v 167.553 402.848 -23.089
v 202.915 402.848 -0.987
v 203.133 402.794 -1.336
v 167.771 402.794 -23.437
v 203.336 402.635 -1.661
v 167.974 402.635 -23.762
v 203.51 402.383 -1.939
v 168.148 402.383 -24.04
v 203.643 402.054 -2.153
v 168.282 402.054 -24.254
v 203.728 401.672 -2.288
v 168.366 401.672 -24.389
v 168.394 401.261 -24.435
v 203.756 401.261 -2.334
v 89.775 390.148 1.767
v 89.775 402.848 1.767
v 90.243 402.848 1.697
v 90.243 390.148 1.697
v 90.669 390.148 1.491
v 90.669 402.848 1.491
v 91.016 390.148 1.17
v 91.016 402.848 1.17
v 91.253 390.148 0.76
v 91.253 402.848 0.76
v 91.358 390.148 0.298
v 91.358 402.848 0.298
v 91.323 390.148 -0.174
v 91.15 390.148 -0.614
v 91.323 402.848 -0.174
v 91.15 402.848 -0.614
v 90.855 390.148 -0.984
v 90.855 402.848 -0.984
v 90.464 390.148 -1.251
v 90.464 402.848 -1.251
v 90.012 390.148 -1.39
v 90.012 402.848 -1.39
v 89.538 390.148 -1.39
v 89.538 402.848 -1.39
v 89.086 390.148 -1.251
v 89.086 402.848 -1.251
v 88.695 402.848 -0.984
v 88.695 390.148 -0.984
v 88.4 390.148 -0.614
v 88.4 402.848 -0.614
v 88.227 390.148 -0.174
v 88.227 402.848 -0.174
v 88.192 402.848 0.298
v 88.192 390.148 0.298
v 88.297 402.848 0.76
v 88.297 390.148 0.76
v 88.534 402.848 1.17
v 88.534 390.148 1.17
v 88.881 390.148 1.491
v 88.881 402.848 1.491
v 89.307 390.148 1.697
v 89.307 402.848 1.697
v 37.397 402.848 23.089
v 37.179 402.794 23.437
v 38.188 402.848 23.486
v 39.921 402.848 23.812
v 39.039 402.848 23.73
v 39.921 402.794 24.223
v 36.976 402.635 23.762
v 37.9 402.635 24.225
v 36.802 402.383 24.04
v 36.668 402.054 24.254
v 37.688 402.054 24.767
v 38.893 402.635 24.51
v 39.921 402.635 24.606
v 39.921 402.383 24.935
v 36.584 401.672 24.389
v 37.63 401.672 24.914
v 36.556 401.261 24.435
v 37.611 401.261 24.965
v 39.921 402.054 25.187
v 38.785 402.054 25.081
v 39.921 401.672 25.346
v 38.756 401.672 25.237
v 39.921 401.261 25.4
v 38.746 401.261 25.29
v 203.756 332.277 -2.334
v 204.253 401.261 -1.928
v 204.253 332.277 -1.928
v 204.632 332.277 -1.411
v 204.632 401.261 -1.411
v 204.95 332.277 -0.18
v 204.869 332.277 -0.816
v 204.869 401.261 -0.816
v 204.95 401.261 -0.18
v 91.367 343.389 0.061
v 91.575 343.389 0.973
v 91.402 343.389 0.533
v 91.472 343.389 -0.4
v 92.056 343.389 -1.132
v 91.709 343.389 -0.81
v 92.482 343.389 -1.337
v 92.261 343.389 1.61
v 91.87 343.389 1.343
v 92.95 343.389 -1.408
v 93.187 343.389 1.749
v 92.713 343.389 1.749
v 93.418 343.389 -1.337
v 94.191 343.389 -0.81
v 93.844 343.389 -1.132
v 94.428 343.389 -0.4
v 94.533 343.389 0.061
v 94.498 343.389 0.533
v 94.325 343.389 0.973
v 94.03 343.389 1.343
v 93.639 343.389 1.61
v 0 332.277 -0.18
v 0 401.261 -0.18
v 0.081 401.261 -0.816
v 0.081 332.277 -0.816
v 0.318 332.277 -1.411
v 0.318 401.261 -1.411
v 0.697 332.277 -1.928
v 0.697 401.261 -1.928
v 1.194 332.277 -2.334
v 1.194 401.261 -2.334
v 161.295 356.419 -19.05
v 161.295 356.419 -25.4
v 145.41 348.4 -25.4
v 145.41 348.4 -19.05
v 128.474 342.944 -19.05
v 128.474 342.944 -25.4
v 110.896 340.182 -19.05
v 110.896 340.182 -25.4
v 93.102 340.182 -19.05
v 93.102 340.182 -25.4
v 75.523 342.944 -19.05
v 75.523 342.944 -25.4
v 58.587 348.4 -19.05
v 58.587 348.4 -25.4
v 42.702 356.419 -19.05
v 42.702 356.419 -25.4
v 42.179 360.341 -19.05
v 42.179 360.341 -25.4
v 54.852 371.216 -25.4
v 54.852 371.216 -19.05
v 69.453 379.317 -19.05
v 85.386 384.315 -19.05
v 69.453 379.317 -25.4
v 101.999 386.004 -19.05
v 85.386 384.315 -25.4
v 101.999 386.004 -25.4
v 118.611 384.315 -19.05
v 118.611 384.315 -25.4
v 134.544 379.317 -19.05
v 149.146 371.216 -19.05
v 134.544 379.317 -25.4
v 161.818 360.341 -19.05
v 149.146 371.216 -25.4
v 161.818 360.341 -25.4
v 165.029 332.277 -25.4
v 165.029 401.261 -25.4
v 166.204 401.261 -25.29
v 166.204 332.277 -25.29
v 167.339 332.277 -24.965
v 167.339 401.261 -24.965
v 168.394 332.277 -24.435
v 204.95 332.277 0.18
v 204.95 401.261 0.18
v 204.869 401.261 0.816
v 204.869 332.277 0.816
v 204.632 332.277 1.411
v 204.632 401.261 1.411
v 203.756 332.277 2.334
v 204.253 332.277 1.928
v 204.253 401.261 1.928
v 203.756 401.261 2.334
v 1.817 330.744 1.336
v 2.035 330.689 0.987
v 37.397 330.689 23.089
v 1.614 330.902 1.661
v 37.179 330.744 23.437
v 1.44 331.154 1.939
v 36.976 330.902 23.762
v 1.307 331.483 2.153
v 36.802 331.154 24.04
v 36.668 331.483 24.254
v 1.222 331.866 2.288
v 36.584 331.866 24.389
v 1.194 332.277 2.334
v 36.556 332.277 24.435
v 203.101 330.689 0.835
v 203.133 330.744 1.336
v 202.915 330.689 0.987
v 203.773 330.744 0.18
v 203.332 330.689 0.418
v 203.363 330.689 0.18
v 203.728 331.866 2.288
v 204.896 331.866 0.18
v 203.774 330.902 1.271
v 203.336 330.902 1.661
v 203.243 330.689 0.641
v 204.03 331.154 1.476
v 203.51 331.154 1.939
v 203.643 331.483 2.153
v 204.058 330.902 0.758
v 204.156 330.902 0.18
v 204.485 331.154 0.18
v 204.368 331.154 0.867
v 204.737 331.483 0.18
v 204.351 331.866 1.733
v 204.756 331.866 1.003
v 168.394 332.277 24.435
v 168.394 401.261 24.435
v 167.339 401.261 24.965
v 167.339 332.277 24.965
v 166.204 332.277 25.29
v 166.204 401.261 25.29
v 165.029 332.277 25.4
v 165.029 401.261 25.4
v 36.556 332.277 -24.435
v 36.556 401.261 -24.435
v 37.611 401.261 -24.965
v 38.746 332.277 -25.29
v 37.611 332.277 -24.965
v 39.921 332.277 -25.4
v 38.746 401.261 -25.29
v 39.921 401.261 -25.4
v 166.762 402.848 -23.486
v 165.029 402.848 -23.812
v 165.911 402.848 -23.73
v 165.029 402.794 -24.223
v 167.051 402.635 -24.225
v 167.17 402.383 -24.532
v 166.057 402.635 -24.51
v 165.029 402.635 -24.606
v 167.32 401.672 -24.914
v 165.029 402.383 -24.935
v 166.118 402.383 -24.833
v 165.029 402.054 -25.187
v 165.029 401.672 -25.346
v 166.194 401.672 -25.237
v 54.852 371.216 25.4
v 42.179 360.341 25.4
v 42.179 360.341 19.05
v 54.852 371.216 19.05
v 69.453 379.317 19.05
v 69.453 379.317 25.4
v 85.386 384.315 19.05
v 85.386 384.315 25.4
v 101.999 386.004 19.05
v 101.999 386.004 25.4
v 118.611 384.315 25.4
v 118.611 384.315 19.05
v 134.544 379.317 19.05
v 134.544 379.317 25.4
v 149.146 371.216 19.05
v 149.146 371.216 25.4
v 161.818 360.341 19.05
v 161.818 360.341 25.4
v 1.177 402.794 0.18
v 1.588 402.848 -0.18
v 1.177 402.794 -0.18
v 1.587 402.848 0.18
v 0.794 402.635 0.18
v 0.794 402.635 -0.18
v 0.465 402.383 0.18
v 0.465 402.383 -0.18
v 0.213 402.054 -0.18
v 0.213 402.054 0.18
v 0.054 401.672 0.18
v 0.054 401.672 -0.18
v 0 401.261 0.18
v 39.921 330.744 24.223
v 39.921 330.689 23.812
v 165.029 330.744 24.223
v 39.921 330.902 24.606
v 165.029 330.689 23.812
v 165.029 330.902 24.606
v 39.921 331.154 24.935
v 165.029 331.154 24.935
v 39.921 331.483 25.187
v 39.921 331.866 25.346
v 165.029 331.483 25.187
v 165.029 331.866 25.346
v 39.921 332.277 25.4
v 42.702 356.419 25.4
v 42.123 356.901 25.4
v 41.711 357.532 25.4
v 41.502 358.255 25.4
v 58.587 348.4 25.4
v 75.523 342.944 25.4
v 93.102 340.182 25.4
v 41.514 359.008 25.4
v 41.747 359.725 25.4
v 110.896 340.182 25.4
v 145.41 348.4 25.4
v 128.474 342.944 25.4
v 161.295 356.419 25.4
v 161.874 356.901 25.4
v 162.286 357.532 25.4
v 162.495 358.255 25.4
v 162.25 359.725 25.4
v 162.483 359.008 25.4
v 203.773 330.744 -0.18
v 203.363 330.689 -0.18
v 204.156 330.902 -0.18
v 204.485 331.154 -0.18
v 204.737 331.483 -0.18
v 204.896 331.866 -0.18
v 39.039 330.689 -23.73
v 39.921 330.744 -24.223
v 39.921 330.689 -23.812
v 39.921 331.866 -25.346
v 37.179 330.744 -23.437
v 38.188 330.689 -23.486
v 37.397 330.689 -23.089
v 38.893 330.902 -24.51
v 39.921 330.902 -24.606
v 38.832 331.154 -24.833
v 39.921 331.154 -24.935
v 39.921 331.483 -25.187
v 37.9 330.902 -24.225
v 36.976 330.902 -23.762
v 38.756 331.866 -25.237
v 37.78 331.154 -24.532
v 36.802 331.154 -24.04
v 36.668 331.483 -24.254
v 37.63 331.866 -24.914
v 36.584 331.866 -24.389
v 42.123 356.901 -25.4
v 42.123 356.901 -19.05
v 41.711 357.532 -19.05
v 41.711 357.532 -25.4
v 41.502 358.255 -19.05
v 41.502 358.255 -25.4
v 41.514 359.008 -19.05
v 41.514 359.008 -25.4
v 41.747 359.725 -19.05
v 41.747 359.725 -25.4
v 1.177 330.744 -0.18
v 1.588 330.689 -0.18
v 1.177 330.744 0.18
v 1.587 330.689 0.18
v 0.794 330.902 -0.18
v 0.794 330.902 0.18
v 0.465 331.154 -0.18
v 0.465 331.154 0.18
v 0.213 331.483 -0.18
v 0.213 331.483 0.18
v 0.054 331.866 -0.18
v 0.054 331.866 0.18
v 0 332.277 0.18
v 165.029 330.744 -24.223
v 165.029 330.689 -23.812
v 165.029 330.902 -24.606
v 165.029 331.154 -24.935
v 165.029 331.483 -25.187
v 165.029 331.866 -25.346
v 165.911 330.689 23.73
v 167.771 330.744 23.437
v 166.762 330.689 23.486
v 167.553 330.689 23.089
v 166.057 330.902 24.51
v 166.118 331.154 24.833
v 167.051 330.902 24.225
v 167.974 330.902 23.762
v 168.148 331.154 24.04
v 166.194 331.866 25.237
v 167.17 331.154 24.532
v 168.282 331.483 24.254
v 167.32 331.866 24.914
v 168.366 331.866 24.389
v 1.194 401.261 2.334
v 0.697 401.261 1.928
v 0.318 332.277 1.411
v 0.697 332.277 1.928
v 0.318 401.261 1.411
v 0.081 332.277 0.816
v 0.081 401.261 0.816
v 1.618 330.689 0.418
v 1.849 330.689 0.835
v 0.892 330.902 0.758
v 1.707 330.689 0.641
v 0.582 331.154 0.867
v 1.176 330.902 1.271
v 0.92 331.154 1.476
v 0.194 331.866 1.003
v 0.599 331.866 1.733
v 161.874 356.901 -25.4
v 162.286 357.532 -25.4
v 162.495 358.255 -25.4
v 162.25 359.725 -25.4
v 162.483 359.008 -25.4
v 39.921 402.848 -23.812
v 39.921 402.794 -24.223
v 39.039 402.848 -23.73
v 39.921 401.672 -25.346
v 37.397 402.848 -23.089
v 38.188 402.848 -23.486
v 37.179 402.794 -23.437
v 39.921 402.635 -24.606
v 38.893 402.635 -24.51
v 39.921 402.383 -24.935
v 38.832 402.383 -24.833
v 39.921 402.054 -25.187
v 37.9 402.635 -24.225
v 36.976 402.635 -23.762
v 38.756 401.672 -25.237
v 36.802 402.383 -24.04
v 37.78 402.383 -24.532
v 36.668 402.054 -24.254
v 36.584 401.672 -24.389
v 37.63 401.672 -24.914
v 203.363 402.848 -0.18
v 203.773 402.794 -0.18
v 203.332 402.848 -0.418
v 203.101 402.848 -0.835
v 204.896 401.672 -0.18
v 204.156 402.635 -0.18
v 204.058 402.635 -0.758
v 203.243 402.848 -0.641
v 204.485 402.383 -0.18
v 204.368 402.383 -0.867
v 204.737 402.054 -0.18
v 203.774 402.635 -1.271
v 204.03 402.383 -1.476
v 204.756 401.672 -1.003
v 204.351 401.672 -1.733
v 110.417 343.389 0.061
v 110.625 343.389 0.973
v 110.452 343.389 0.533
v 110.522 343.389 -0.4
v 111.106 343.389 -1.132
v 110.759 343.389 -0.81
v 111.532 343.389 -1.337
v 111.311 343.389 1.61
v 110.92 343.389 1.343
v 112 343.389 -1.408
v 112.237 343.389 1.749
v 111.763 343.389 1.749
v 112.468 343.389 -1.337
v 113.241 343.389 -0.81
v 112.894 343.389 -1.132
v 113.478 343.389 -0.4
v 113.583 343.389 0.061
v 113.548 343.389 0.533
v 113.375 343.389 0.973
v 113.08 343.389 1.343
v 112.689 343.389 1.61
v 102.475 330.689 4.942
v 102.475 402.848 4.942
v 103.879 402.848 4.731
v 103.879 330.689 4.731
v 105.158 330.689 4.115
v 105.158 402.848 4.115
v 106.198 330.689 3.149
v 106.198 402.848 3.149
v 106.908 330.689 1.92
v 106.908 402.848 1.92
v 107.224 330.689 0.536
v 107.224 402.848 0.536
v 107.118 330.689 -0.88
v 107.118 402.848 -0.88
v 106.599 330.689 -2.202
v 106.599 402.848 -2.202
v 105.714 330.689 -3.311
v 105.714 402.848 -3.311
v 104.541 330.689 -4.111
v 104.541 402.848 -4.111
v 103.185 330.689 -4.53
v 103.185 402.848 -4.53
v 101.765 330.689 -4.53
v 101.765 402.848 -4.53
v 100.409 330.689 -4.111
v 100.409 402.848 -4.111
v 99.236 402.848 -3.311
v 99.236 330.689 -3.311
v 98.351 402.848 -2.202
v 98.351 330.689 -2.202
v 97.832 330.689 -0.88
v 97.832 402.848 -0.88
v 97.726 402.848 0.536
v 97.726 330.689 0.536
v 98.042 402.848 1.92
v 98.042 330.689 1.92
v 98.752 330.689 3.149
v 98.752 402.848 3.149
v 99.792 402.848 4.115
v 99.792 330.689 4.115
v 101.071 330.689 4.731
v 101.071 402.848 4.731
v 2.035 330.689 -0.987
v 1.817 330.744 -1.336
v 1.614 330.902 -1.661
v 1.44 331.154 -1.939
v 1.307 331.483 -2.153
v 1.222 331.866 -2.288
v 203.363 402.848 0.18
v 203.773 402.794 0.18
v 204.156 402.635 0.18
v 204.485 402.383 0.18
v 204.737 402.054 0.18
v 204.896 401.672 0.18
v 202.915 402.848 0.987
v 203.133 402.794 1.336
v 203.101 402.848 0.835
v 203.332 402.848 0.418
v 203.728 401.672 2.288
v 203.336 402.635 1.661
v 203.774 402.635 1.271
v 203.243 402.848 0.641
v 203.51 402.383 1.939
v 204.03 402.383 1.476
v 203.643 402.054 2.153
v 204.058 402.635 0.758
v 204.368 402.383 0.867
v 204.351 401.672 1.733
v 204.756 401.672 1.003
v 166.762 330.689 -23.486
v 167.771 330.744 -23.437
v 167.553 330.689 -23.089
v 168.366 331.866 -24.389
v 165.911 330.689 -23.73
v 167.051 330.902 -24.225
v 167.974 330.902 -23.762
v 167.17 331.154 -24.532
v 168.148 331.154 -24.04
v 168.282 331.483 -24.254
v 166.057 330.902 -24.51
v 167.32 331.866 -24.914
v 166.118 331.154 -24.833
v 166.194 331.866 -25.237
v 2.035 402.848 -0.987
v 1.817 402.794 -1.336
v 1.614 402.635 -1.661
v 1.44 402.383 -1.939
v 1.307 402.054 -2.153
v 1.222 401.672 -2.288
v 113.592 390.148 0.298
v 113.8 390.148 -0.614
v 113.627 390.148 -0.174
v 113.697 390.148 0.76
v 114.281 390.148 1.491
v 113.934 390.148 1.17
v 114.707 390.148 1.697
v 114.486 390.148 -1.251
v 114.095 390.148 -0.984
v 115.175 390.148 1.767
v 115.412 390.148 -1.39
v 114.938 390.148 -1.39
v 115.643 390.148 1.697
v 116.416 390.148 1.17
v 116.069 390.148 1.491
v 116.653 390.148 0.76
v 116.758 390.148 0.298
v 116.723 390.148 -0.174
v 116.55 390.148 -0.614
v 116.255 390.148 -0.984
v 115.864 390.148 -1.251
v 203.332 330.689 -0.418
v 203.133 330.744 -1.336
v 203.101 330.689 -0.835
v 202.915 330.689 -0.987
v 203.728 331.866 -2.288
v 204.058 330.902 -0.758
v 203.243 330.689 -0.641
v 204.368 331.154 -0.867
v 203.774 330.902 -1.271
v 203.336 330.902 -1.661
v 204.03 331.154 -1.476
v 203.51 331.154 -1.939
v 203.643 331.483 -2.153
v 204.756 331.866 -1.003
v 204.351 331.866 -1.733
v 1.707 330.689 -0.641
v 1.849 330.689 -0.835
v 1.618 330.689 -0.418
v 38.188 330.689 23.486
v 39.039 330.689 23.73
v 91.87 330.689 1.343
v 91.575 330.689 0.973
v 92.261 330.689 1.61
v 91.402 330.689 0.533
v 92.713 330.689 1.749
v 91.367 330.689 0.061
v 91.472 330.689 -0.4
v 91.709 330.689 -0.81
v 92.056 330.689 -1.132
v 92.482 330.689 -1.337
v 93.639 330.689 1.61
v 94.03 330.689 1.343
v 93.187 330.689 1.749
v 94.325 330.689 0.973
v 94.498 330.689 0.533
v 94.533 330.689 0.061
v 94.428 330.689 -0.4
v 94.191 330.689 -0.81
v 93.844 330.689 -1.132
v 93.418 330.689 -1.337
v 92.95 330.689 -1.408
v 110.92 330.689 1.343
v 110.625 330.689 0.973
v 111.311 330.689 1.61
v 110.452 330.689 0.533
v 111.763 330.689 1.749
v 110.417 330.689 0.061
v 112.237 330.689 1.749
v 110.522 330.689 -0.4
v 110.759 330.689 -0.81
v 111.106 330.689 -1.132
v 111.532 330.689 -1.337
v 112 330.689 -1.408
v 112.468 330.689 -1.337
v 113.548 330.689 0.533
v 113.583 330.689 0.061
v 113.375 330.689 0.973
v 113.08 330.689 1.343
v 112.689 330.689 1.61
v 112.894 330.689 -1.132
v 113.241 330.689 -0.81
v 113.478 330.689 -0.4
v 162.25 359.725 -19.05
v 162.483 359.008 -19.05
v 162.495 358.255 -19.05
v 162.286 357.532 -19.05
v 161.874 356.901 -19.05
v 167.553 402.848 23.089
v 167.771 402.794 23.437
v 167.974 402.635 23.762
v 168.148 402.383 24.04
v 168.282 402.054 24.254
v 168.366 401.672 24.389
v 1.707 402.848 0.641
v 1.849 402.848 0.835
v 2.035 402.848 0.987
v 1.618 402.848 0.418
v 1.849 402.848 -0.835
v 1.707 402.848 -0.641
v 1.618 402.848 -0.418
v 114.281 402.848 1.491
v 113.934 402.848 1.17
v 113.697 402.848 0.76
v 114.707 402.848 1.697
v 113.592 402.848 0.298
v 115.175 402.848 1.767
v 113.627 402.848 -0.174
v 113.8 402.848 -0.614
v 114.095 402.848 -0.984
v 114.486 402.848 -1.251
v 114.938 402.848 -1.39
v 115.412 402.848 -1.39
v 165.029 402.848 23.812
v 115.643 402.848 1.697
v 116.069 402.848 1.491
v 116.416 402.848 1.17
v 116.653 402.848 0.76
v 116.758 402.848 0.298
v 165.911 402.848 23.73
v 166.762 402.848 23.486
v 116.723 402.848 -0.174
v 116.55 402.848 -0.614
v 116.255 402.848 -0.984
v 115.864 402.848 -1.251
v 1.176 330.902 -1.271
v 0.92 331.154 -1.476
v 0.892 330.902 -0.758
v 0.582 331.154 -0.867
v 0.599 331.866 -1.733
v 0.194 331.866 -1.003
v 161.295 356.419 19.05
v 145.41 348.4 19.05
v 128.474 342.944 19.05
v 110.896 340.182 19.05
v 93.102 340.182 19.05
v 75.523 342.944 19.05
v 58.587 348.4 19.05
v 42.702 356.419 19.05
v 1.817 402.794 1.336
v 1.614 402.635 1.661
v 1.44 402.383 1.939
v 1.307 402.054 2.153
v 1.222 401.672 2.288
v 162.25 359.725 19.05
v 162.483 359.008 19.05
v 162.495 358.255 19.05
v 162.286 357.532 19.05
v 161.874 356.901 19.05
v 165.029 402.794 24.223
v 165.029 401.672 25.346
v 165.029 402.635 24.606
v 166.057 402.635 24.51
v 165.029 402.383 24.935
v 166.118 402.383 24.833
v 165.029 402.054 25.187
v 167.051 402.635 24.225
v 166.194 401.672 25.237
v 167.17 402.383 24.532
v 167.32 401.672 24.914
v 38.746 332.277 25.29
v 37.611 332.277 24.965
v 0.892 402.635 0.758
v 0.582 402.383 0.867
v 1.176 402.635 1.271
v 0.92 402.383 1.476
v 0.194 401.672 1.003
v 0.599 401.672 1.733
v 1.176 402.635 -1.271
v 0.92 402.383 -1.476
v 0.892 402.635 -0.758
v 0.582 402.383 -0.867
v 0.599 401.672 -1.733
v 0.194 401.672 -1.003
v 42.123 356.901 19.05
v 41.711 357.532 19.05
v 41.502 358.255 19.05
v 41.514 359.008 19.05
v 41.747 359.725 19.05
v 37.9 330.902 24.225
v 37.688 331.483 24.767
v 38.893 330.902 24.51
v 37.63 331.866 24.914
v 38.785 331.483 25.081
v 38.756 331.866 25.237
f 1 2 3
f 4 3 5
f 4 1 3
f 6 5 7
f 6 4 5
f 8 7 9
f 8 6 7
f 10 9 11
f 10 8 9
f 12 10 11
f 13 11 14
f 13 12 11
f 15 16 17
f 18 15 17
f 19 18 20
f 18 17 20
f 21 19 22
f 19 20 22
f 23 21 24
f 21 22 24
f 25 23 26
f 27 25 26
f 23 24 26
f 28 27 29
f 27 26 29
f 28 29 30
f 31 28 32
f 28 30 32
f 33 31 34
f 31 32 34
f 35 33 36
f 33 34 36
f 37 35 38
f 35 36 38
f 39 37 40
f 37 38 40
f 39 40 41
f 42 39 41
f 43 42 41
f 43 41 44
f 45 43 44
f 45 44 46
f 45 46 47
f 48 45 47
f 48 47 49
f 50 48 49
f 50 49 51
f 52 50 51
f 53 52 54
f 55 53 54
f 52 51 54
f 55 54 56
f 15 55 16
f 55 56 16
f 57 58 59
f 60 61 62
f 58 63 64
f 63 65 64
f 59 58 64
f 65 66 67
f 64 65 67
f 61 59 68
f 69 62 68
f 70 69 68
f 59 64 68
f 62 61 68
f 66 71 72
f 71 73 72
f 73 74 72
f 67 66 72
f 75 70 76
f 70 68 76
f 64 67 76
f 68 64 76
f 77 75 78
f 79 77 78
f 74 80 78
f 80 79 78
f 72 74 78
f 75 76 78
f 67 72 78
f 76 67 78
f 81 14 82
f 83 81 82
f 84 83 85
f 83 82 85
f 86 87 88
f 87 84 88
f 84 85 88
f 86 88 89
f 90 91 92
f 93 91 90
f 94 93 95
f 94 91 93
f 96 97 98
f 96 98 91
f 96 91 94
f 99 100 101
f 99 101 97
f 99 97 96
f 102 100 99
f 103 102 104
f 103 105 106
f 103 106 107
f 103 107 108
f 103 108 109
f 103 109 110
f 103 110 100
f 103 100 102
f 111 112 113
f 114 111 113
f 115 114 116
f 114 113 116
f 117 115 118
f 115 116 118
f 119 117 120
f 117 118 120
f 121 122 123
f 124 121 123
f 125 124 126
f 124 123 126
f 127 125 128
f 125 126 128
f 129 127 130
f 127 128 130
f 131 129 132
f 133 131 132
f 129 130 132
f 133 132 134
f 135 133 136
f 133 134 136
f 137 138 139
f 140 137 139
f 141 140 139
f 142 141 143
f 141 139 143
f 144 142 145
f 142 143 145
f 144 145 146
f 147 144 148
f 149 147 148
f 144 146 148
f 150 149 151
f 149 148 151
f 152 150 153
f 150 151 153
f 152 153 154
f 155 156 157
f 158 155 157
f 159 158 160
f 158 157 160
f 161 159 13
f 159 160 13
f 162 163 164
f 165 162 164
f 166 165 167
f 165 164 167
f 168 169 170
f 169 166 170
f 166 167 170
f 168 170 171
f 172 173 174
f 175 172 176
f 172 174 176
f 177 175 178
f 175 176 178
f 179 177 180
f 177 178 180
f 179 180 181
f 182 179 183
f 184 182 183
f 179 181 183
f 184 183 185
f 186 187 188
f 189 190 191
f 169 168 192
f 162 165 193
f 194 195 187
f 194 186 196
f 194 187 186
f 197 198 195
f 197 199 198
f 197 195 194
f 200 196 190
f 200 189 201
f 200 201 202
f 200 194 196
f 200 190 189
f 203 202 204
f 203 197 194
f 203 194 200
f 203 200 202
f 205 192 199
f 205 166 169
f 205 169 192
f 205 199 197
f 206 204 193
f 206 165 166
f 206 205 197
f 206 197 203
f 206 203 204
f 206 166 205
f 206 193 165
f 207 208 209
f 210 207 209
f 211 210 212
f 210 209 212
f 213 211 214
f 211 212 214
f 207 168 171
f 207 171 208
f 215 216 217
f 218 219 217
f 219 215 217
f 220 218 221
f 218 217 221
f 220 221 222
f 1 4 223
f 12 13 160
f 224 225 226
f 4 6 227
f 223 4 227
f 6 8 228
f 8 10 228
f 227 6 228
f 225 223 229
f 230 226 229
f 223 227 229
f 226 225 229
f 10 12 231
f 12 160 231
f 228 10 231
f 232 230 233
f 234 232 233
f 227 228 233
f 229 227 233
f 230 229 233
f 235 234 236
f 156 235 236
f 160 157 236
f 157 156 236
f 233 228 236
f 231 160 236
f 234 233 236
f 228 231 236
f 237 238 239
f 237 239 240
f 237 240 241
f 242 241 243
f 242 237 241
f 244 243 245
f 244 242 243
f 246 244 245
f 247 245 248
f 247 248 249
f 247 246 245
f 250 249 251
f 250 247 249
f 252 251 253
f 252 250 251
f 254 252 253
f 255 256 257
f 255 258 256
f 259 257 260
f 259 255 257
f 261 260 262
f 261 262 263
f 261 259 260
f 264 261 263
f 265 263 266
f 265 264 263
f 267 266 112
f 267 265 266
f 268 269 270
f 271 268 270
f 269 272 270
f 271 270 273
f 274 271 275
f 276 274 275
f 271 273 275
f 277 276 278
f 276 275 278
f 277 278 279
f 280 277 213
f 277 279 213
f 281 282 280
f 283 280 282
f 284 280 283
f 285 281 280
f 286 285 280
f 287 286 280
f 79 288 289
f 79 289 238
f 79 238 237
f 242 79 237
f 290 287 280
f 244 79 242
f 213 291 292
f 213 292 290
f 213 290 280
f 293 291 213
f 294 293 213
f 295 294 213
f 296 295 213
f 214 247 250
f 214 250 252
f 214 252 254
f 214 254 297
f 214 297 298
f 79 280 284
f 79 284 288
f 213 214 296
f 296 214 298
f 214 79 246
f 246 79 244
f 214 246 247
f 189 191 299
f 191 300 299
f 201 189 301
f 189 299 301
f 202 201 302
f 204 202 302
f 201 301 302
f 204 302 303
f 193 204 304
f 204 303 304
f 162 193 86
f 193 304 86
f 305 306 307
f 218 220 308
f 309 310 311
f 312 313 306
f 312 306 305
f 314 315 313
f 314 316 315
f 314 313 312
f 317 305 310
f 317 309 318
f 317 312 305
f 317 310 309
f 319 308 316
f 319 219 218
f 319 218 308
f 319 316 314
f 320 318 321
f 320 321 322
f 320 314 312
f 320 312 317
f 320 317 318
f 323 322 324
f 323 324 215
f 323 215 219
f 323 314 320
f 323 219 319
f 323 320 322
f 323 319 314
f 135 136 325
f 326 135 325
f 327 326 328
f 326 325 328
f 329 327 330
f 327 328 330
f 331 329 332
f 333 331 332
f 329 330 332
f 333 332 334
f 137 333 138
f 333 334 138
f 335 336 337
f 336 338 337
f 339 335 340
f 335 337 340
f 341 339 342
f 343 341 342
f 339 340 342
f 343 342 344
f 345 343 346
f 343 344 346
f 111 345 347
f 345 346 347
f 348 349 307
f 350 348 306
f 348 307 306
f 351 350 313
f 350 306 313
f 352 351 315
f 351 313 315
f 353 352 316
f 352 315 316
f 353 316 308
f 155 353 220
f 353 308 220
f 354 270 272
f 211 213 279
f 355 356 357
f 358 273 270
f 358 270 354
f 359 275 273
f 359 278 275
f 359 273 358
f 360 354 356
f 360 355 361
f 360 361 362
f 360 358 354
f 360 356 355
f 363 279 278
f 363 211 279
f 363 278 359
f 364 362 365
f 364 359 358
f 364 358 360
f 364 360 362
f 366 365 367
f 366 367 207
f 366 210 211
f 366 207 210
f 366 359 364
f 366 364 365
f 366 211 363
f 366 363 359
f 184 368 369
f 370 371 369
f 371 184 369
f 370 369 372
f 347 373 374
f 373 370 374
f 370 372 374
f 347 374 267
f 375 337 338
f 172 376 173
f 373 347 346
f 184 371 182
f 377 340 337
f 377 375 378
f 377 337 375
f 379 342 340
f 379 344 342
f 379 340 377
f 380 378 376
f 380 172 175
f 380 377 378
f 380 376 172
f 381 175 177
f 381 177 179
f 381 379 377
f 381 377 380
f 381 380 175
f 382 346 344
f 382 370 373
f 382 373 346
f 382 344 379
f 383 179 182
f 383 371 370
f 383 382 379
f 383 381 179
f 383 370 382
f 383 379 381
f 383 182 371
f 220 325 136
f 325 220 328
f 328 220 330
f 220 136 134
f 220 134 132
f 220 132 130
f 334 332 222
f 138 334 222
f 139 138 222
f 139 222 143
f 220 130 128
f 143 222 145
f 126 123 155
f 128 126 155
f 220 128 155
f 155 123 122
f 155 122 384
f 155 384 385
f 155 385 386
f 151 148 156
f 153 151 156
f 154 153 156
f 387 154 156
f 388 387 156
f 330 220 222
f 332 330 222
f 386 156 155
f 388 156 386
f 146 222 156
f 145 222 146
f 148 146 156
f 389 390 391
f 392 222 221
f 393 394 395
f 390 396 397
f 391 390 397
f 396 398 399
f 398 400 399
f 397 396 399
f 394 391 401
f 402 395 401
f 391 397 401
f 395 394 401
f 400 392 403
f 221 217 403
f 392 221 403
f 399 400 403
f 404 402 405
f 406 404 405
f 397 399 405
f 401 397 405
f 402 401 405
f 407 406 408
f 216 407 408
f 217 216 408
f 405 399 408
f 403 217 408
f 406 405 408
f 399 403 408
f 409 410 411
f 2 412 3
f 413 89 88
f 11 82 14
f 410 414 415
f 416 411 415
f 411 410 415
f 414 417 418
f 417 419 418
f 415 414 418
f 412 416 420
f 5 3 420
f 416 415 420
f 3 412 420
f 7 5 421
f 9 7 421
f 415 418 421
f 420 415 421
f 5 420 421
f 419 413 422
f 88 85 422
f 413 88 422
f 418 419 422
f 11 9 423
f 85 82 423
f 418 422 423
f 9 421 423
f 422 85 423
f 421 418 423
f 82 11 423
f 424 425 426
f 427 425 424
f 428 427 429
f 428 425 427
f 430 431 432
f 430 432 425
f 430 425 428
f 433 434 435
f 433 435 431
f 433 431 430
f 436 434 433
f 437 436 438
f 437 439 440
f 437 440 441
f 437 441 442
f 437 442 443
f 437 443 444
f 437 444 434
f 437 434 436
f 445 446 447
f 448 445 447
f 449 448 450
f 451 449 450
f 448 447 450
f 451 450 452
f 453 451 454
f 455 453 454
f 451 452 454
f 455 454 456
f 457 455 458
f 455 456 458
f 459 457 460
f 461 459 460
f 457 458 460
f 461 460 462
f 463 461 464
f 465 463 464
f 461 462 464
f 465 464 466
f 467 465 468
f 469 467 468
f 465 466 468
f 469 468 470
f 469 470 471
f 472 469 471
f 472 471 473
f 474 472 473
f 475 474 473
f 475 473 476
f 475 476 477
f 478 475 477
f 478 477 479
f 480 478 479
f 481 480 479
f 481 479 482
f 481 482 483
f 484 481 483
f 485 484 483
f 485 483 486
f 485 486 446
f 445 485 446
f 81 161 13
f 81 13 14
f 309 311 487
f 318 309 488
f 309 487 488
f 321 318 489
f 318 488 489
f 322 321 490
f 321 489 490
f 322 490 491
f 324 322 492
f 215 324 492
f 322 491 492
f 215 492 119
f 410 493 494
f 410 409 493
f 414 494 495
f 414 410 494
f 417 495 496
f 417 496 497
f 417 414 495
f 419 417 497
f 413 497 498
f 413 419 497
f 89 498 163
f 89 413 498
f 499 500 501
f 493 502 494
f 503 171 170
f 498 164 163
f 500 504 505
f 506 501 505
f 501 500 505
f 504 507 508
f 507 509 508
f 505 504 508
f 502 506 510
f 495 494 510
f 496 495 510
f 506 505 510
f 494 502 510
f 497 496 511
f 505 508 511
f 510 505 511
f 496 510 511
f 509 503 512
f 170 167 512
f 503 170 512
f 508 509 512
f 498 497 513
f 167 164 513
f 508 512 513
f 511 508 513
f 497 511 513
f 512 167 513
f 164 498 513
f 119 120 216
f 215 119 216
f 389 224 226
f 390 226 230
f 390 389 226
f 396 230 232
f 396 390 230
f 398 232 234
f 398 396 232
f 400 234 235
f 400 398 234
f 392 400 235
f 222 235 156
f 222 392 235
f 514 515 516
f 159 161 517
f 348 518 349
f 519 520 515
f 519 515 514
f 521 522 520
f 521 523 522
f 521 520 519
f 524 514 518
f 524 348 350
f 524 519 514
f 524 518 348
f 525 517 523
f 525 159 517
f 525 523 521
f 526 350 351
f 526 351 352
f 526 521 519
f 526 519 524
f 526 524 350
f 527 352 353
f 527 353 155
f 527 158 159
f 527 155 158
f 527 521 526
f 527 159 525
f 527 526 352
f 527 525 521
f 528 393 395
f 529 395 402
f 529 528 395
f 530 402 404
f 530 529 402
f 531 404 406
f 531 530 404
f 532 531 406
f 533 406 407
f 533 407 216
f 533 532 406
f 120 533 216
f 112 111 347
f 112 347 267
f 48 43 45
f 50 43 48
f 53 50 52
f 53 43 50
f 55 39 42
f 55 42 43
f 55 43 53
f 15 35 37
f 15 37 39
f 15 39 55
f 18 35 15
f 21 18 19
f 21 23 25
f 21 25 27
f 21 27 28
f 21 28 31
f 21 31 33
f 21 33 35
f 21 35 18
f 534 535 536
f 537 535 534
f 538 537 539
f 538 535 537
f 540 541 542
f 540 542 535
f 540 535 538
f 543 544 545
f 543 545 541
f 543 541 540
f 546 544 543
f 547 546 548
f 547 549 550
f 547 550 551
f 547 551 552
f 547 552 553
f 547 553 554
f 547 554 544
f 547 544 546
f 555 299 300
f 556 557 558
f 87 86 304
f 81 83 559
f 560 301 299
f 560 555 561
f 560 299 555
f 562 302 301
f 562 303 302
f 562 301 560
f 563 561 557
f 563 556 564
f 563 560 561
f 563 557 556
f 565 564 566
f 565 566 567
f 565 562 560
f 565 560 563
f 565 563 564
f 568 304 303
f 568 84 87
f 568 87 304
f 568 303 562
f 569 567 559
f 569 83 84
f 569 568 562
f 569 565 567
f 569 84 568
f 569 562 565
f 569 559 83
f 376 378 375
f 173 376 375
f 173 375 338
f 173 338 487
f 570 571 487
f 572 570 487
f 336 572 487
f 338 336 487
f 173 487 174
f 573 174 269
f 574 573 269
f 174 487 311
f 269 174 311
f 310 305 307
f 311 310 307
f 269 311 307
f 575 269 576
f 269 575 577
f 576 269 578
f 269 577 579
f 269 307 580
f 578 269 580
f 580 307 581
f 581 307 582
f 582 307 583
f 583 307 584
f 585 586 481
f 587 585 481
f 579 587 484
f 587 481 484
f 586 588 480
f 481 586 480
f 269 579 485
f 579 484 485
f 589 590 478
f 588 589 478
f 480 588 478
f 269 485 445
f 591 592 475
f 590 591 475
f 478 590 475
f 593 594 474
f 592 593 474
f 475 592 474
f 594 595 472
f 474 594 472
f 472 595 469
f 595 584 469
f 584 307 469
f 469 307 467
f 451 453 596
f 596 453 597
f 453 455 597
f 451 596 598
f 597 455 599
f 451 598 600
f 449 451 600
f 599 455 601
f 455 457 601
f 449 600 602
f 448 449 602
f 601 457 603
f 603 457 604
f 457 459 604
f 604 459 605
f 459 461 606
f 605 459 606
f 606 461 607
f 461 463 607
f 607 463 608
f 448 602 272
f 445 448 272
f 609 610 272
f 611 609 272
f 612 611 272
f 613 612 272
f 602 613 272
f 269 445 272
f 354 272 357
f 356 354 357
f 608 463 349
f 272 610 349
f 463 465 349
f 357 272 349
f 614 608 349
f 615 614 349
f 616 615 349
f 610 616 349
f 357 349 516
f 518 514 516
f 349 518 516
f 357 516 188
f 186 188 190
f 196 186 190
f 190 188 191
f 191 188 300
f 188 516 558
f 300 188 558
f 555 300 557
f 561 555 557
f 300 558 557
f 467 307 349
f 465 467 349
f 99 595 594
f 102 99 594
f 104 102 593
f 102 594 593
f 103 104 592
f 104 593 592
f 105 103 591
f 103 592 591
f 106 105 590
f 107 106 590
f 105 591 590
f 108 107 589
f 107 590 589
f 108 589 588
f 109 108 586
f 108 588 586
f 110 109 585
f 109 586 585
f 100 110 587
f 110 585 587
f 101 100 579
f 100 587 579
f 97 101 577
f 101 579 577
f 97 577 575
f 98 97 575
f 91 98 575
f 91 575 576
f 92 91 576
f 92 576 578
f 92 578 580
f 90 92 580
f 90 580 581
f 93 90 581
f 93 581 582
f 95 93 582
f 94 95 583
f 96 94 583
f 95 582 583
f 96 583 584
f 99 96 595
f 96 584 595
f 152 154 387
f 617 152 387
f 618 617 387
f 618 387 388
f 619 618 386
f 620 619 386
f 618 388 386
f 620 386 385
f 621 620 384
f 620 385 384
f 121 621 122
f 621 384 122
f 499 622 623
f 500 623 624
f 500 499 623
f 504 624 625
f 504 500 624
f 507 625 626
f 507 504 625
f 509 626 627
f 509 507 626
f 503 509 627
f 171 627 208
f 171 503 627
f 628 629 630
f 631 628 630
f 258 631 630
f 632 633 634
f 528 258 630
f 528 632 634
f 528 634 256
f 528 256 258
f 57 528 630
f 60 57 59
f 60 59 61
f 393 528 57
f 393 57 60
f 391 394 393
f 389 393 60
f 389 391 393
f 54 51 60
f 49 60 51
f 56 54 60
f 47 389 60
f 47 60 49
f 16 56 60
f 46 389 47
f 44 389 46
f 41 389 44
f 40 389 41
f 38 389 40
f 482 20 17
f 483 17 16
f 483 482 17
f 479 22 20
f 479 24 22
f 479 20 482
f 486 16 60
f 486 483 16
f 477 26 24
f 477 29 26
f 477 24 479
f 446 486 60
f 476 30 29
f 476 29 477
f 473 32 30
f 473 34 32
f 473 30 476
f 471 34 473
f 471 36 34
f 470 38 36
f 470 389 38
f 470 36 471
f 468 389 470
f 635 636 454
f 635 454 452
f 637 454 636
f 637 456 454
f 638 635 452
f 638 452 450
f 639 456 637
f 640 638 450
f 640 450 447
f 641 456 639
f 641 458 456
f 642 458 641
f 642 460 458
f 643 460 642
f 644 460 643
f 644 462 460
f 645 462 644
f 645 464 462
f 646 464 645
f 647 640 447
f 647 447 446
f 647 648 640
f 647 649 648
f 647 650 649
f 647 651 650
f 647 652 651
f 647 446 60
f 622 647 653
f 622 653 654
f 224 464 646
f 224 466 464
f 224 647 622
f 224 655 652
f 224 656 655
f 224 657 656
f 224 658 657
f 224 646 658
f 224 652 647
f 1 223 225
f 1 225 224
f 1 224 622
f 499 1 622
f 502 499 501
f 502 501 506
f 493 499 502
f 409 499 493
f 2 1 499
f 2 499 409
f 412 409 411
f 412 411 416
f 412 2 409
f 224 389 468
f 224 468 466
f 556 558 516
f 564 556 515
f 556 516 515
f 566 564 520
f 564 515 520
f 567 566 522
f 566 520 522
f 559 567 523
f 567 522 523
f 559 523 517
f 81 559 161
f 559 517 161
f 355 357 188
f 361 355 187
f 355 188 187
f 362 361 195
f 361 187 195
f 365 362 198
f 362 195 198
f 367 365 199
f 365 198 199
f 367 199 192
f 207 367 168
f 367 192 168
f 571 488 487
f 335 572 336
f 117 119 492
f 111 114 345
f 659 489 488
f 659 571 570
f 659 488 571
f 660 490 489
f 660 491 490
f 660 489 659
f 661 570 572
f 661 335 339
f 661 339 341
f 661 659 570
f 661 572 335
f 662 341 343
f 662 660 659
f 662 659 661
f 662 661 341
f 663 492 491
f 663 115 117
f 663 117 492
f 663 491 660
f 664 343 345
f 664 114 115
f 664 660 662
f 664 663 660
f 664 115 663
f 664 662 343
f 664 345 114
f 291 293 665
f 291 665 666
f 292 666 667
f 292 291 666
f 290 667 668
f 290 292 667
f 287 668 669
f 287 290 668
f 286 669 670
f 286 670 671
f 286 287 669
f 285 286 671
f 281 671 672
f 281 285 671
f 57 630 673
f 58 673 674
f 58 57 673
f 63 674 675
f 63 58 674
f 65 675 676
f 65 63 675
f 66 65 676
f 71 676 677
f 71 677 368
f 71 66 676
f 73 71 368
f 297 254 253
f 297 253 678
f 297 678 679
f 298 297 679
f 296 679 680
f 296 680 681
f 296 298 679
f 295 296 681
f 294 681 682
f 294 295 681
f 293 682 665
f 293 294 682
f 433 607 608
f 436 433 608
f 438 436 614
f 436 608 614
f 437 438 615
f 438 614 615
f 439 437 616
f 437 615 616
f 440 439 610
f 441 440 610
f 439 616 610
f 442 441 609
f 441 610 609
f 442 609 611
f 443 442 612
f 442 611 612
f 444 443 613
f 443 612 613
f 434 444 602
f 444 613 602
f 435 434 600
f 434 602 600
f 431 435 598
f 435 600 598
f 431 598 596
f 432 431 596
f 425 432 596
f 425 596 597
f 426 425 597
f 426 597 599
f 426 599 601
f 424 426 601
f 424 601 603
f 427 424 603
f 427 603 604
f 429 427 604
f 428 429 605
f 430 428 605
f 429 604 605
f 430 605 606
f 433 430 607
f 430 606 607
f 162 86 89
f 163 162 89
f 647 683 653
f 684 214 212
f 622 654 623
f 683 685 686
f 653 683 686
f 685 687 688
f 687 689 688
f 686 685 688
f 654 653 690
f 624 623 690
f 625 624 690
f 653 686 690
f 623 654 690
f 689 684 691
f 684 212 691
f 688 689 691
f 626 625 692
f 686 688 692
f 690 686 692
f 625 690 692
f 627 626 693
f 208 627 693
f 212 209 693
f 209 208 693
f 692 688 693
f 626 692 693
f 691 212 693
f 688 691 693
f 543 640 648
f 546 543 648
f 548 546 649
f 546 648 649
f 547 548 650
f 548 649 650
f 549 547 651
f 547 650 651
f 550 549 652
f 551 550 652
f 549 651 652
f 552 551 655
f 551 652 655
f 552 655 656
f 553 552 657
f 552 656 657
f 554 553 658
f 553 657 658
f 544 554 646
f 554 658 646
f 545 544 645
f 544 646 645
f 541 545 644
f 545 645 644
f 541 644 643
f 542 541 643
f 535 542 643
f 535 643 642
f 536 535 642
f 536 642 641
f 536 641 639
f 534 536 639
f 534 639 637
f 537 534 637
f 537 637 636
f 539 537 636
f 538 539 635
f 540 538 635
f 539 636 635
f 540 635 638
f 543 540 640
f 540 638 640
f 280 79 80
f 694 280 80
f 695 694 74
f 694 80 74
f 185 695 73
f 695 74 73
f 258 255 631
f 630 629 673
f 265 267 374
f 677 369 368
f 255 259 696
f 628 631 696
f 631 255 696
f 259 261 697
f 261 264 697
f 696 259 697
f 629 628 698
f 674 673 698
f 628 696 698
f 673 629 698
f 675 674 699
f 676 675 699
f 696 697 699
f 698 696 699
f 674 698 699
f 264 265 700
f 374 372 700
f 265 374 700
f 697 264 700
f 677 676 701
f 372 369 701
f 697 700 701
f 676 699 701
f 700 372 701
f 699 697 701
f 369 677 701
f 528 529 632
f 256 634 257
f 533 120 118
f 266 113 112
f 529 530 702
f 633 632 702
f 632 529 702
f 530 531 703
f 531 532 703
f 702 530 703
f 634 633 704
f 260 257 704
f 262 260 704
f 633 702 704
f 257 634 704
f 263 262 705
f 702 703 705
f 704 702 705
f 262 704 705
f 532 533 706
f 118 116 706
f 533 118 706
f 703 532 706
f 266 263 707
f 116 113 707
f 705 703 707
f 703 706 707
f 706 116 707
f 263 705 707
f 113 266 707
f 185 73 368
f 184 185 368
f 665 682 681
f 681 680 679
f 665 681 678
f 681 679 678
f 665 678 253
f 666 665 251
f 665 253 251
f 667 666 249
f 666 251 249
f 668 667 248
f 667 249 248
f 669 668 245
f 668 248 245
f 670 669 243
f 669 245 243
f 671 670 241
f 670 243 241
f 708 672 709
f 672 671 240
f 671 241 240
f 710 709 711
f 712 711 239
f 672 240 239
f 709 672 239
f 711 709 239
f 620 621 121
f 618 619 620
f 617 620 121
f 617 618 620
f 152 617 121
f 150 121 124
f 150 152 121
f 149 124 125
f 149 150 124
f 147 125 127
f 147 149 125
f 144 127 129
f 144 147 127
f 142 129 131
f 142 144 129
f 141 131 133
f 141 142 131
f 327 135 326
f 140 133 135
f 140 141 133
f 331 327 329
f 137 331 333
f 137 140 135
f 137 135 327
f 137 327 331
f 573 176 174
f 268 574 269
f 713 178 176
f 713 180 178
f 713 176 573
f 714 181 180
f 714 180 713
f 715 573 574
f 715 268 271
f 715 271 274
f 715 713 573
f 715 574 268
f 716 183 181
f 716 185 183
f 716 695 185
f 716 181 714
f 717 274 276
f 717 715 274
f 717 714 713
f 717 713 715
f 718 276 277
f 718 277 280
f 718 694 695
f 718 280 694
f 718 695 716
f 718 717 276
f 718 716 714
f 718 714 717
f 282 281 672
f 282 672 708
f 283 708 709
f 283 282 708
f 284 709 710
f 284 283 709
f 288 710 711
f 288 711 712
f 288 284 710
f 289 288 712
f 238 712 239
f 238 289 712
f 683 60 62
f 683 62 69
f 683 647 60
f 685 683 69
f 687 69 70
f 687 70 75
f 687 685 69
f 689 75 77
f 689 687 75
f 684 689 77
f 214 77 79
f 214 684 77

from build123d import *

# Parameters (mm, degrees)
BOSS_EXTRUDE1_DEPTH      = 25.4
BOSS_EXTRUDE1_DEPTH_BACK = 25.4
SKETCH1_W                = 204.950025332
SKETCH1_H                = 72.158698858
SKETCH2_W                = 220.605080335
SKETCH2_H                = 76.557810487
SKETCH2_R                = 4.7625
CUT_EXTRUDE1_DEPTH       = 219.761401313
FILLET1_R                = 1.5875
CUT_EXTRUDE2_DEPTH       = 6.35
SKETCH4_R                = 1.5875
CUT_EXTRUDE3_DEPTH       = 12.7
SKETCH5_R                = 1.5875
CUT_EXTRUDE4_DEPTH       = 12.7


with BuildPart() as part:
    # Sketch1 → Boss-Extrude1 (new, two sides: drawn at the far end of the back side and taken through both)
    with BuildSketch(Plane.XY.offset(-BOSS_EXTRUDE1_DEPTH_BACK)):
        with Locations((102.475012666, 366.768835108)):
            Rectangle(SKETCH1_W, SKETCH1_H)
    extrude(amount=BOSS_EXTRUDE1_DEPTH + BOSS_EXTRUDE1_DEPTH_BACK)

    # Sketch2 → Cut-Extrude1 (cut, through all)
    # profile 1 of 2: a face of its own
    with BuildSketch(Plane(origin=(0, 402.848184537, 0), x_dir=(1, 0, 0), z_dir=(0, 1, 0))):
        with Locations((101.602425497, 0.332919425)):
            Rectangle(SKETCH2_W, SKETCH2_H)
        with BuildLine():
            Line((36.555662769, -24.43478923), (1.193802692, -2.333626683))
            ThreePointArc((1.193802692, -2.333626683), (0.318408098, -1.411023063), (0, -0.179710991))
            Line((0, -0.179710991), (0, 0.179710991))
            ThreePointArc((0, 0.179710991), (0.318408098, 1.411023063), (1.193802692, 2.333626683))
            Line((1.193802692, 2.333626683), (36.555662769, 24.43478923))
            ThreePointArc((36.555662769, 24.43478923), (38.17057208, 25.153929538), (39.921156038, 25.4))
            Line((39.921156038, 25.4), (165.028869294, 25.4))
            ThreePointArc((165.028869294, 25.4), (166.779453252, 25.153929538), (168.394362563, 24.43478923))
            Line((168.394362563, 24.43478923), (203.756222639, 2.333626683))
            ThreePointArc((203.756222639, 2.333626683), (204.631617234, 1.411023063), (204.950025332, 0.179710991))
            Line((204.950025332, 0.179710991), (204.950025332, -0.179710991))
            ThreePointArc((204.950025332, -0.179710991), (204.631617234, -1.411023063), (203.756222639, -2.333626683))
            Line((203.756222639, -2.333626683), (168.394362563, -24.43478923))
            ThreePointArc((168.394362563, -24.43478923), (166.779453252, -25.153929538), (165.028869294, -25.4))
            Line((165.028869294, -25.4), (39.921156038, -25.4))
            ThreePointArc((39.921156038, -25.4), (38.17057208, -25.153929538), (36.555662769, -24.43478923))
        make_face(mode=Mode.SUBTRACT)
    # profile 2 of 2: a face of its own
    with BuildSketch(Plane(origin=(0, 402.848184537, 0), x_dir=(1, 0, 0), z_dir=(0, 1, 0))):
        with Locations((102.475012666, -0.179710991)):
            Circle(SKETCH2_R)
    extrude(amount=-CUT_EXTRUDE1_DEPTH, mode=Mode.SUBTRACT)

    # Fillet1
    fillet1_edges = [part.edges().sort_by_distance(p)[0] for p in [
        (38.17057208, 330.689485679, 25.153929538),
        (18.874732731, 330.689485679, 13.384207957),
        (0.318408098, 330.689485679, 1.411023063),
        (0, 330.689485679, 0),
        (0.318408098, 330.689485679, -1.411023063),
        (18.874732731, 330.689485679, -13.384207957),
        (38.17057208, 330.689485679, -25.153929538),
        (102.475012666, 330.689485679, -25.4),
        (166.779453252, 330.689485679, -25.153929538),
        (186.075292601, 330.689485679, -13.384207957),
        (204.631617234, 330.689485679, -1.411023063),
        (204.950025332, 330.689485679, 0),
        (204.631617234, 330.689485679, 1.411023063),
        (186.075292601, 330.689485679, 13.384207957),
        (166.779453252, 330.689485679, 25.153929538),
        (0.318408098, 402.848184537, 1.411023063),
        (0, 402.848184537, 0),
        (0.318408098, 402.848184537, -1.411023063),
        (18.874732731, 402.848184537, -13.384207957),
        (38.17057208, 402.848184537, -25.153929538),
        (102.475012666, 402.848184537, -25.4),
        (166.779453252, 402.848184537, -25.153929538),
        (186.075292601, 402.848184537, -13.384207957),
        (204.631617234, 402.848184537, -1.411023063),
        (204.950025332, 402.848184537, 0),
        (204.631617234, 402.848184537, 1.411023063),
        (186.075292601, 402.848184537, 13.384207957),
        (166.779453252, 402.848184537, 25.153929538),
        (102.475012666, 402.848184537, 25.4),
        (38.17057208, 402.848184537, 25.153929538),
        (102.475012666, 330.689485679, 25.4),
        (18.874732731, 402.848184537, 13.384207957),
    ]]
    fillet(fillet1_edges, radius=FILLET1_R)

    # Sketch3 → Cut-Extrude2 (cut)
    with BuildSketch(Plane.XY.offset(25.4)):
        with BuildLine():
            ThreePointArc((42.179379055, 360.341209381), (101.998613328, 386.003937421), (161.817847601, 360.341209381))
            ThreePointArc((161.817847601, 360.341209381), (162.494976111, 358.255146927), (161.294952196, 356.419363121))
            ThreePointArc((161.294952196, 356.419363121), (101.998613328, 339.835452874), (42.702274459, 356.419363121))
            ThreePointArc((42.702274459, 356.419363121), (41.502250545, 358.255146927), (42.179379055, 360.341209381))
        make_face()
    cut_extrude2 = extrude(amount=-CUT_EXTRUDE2_DEPTH, mode=Mode.SUBTRACT)

    # Mirror1: Cut-Extrude2 across plane
    add(cut_extrude2.mirror(Plane.XY), mode=Mode.SUBTRACT)

    # Sketch4 → Cut-Extrude3 (cut)
    with BuildSketch(Plane.XZ.offset(-330.689485679)):
        with Locations((92.950012666, 0.179710991)):
            Circle(SKETCH4_R)
        with Locations((112.000012666, 0.179710991)):
            Circle(SKETCH4_R)
    extrude(amount=-CUT_EXTRUDE3_DEPTH, mode=Mode.SUBTRACT)

    # Sketch5 → Cut-Extrude4 (cut)
    with BuildSketch(Plane(origin=(0, 402.848184537, 0), x_dir=(1, 0, 0), z_dir=(0, 1, 0))):
        with Locations((89.775012666, -0.179710991)):
            Circle(SKETCH5_R)
        with Locations((115.175012666, -0.179710991)):
            Circle(SKETCH5_R)
    extrude(amount=-CUT_EXTRUDE4_DEPTH, mode=Mode.SUBTRACT)


solid = part.part
